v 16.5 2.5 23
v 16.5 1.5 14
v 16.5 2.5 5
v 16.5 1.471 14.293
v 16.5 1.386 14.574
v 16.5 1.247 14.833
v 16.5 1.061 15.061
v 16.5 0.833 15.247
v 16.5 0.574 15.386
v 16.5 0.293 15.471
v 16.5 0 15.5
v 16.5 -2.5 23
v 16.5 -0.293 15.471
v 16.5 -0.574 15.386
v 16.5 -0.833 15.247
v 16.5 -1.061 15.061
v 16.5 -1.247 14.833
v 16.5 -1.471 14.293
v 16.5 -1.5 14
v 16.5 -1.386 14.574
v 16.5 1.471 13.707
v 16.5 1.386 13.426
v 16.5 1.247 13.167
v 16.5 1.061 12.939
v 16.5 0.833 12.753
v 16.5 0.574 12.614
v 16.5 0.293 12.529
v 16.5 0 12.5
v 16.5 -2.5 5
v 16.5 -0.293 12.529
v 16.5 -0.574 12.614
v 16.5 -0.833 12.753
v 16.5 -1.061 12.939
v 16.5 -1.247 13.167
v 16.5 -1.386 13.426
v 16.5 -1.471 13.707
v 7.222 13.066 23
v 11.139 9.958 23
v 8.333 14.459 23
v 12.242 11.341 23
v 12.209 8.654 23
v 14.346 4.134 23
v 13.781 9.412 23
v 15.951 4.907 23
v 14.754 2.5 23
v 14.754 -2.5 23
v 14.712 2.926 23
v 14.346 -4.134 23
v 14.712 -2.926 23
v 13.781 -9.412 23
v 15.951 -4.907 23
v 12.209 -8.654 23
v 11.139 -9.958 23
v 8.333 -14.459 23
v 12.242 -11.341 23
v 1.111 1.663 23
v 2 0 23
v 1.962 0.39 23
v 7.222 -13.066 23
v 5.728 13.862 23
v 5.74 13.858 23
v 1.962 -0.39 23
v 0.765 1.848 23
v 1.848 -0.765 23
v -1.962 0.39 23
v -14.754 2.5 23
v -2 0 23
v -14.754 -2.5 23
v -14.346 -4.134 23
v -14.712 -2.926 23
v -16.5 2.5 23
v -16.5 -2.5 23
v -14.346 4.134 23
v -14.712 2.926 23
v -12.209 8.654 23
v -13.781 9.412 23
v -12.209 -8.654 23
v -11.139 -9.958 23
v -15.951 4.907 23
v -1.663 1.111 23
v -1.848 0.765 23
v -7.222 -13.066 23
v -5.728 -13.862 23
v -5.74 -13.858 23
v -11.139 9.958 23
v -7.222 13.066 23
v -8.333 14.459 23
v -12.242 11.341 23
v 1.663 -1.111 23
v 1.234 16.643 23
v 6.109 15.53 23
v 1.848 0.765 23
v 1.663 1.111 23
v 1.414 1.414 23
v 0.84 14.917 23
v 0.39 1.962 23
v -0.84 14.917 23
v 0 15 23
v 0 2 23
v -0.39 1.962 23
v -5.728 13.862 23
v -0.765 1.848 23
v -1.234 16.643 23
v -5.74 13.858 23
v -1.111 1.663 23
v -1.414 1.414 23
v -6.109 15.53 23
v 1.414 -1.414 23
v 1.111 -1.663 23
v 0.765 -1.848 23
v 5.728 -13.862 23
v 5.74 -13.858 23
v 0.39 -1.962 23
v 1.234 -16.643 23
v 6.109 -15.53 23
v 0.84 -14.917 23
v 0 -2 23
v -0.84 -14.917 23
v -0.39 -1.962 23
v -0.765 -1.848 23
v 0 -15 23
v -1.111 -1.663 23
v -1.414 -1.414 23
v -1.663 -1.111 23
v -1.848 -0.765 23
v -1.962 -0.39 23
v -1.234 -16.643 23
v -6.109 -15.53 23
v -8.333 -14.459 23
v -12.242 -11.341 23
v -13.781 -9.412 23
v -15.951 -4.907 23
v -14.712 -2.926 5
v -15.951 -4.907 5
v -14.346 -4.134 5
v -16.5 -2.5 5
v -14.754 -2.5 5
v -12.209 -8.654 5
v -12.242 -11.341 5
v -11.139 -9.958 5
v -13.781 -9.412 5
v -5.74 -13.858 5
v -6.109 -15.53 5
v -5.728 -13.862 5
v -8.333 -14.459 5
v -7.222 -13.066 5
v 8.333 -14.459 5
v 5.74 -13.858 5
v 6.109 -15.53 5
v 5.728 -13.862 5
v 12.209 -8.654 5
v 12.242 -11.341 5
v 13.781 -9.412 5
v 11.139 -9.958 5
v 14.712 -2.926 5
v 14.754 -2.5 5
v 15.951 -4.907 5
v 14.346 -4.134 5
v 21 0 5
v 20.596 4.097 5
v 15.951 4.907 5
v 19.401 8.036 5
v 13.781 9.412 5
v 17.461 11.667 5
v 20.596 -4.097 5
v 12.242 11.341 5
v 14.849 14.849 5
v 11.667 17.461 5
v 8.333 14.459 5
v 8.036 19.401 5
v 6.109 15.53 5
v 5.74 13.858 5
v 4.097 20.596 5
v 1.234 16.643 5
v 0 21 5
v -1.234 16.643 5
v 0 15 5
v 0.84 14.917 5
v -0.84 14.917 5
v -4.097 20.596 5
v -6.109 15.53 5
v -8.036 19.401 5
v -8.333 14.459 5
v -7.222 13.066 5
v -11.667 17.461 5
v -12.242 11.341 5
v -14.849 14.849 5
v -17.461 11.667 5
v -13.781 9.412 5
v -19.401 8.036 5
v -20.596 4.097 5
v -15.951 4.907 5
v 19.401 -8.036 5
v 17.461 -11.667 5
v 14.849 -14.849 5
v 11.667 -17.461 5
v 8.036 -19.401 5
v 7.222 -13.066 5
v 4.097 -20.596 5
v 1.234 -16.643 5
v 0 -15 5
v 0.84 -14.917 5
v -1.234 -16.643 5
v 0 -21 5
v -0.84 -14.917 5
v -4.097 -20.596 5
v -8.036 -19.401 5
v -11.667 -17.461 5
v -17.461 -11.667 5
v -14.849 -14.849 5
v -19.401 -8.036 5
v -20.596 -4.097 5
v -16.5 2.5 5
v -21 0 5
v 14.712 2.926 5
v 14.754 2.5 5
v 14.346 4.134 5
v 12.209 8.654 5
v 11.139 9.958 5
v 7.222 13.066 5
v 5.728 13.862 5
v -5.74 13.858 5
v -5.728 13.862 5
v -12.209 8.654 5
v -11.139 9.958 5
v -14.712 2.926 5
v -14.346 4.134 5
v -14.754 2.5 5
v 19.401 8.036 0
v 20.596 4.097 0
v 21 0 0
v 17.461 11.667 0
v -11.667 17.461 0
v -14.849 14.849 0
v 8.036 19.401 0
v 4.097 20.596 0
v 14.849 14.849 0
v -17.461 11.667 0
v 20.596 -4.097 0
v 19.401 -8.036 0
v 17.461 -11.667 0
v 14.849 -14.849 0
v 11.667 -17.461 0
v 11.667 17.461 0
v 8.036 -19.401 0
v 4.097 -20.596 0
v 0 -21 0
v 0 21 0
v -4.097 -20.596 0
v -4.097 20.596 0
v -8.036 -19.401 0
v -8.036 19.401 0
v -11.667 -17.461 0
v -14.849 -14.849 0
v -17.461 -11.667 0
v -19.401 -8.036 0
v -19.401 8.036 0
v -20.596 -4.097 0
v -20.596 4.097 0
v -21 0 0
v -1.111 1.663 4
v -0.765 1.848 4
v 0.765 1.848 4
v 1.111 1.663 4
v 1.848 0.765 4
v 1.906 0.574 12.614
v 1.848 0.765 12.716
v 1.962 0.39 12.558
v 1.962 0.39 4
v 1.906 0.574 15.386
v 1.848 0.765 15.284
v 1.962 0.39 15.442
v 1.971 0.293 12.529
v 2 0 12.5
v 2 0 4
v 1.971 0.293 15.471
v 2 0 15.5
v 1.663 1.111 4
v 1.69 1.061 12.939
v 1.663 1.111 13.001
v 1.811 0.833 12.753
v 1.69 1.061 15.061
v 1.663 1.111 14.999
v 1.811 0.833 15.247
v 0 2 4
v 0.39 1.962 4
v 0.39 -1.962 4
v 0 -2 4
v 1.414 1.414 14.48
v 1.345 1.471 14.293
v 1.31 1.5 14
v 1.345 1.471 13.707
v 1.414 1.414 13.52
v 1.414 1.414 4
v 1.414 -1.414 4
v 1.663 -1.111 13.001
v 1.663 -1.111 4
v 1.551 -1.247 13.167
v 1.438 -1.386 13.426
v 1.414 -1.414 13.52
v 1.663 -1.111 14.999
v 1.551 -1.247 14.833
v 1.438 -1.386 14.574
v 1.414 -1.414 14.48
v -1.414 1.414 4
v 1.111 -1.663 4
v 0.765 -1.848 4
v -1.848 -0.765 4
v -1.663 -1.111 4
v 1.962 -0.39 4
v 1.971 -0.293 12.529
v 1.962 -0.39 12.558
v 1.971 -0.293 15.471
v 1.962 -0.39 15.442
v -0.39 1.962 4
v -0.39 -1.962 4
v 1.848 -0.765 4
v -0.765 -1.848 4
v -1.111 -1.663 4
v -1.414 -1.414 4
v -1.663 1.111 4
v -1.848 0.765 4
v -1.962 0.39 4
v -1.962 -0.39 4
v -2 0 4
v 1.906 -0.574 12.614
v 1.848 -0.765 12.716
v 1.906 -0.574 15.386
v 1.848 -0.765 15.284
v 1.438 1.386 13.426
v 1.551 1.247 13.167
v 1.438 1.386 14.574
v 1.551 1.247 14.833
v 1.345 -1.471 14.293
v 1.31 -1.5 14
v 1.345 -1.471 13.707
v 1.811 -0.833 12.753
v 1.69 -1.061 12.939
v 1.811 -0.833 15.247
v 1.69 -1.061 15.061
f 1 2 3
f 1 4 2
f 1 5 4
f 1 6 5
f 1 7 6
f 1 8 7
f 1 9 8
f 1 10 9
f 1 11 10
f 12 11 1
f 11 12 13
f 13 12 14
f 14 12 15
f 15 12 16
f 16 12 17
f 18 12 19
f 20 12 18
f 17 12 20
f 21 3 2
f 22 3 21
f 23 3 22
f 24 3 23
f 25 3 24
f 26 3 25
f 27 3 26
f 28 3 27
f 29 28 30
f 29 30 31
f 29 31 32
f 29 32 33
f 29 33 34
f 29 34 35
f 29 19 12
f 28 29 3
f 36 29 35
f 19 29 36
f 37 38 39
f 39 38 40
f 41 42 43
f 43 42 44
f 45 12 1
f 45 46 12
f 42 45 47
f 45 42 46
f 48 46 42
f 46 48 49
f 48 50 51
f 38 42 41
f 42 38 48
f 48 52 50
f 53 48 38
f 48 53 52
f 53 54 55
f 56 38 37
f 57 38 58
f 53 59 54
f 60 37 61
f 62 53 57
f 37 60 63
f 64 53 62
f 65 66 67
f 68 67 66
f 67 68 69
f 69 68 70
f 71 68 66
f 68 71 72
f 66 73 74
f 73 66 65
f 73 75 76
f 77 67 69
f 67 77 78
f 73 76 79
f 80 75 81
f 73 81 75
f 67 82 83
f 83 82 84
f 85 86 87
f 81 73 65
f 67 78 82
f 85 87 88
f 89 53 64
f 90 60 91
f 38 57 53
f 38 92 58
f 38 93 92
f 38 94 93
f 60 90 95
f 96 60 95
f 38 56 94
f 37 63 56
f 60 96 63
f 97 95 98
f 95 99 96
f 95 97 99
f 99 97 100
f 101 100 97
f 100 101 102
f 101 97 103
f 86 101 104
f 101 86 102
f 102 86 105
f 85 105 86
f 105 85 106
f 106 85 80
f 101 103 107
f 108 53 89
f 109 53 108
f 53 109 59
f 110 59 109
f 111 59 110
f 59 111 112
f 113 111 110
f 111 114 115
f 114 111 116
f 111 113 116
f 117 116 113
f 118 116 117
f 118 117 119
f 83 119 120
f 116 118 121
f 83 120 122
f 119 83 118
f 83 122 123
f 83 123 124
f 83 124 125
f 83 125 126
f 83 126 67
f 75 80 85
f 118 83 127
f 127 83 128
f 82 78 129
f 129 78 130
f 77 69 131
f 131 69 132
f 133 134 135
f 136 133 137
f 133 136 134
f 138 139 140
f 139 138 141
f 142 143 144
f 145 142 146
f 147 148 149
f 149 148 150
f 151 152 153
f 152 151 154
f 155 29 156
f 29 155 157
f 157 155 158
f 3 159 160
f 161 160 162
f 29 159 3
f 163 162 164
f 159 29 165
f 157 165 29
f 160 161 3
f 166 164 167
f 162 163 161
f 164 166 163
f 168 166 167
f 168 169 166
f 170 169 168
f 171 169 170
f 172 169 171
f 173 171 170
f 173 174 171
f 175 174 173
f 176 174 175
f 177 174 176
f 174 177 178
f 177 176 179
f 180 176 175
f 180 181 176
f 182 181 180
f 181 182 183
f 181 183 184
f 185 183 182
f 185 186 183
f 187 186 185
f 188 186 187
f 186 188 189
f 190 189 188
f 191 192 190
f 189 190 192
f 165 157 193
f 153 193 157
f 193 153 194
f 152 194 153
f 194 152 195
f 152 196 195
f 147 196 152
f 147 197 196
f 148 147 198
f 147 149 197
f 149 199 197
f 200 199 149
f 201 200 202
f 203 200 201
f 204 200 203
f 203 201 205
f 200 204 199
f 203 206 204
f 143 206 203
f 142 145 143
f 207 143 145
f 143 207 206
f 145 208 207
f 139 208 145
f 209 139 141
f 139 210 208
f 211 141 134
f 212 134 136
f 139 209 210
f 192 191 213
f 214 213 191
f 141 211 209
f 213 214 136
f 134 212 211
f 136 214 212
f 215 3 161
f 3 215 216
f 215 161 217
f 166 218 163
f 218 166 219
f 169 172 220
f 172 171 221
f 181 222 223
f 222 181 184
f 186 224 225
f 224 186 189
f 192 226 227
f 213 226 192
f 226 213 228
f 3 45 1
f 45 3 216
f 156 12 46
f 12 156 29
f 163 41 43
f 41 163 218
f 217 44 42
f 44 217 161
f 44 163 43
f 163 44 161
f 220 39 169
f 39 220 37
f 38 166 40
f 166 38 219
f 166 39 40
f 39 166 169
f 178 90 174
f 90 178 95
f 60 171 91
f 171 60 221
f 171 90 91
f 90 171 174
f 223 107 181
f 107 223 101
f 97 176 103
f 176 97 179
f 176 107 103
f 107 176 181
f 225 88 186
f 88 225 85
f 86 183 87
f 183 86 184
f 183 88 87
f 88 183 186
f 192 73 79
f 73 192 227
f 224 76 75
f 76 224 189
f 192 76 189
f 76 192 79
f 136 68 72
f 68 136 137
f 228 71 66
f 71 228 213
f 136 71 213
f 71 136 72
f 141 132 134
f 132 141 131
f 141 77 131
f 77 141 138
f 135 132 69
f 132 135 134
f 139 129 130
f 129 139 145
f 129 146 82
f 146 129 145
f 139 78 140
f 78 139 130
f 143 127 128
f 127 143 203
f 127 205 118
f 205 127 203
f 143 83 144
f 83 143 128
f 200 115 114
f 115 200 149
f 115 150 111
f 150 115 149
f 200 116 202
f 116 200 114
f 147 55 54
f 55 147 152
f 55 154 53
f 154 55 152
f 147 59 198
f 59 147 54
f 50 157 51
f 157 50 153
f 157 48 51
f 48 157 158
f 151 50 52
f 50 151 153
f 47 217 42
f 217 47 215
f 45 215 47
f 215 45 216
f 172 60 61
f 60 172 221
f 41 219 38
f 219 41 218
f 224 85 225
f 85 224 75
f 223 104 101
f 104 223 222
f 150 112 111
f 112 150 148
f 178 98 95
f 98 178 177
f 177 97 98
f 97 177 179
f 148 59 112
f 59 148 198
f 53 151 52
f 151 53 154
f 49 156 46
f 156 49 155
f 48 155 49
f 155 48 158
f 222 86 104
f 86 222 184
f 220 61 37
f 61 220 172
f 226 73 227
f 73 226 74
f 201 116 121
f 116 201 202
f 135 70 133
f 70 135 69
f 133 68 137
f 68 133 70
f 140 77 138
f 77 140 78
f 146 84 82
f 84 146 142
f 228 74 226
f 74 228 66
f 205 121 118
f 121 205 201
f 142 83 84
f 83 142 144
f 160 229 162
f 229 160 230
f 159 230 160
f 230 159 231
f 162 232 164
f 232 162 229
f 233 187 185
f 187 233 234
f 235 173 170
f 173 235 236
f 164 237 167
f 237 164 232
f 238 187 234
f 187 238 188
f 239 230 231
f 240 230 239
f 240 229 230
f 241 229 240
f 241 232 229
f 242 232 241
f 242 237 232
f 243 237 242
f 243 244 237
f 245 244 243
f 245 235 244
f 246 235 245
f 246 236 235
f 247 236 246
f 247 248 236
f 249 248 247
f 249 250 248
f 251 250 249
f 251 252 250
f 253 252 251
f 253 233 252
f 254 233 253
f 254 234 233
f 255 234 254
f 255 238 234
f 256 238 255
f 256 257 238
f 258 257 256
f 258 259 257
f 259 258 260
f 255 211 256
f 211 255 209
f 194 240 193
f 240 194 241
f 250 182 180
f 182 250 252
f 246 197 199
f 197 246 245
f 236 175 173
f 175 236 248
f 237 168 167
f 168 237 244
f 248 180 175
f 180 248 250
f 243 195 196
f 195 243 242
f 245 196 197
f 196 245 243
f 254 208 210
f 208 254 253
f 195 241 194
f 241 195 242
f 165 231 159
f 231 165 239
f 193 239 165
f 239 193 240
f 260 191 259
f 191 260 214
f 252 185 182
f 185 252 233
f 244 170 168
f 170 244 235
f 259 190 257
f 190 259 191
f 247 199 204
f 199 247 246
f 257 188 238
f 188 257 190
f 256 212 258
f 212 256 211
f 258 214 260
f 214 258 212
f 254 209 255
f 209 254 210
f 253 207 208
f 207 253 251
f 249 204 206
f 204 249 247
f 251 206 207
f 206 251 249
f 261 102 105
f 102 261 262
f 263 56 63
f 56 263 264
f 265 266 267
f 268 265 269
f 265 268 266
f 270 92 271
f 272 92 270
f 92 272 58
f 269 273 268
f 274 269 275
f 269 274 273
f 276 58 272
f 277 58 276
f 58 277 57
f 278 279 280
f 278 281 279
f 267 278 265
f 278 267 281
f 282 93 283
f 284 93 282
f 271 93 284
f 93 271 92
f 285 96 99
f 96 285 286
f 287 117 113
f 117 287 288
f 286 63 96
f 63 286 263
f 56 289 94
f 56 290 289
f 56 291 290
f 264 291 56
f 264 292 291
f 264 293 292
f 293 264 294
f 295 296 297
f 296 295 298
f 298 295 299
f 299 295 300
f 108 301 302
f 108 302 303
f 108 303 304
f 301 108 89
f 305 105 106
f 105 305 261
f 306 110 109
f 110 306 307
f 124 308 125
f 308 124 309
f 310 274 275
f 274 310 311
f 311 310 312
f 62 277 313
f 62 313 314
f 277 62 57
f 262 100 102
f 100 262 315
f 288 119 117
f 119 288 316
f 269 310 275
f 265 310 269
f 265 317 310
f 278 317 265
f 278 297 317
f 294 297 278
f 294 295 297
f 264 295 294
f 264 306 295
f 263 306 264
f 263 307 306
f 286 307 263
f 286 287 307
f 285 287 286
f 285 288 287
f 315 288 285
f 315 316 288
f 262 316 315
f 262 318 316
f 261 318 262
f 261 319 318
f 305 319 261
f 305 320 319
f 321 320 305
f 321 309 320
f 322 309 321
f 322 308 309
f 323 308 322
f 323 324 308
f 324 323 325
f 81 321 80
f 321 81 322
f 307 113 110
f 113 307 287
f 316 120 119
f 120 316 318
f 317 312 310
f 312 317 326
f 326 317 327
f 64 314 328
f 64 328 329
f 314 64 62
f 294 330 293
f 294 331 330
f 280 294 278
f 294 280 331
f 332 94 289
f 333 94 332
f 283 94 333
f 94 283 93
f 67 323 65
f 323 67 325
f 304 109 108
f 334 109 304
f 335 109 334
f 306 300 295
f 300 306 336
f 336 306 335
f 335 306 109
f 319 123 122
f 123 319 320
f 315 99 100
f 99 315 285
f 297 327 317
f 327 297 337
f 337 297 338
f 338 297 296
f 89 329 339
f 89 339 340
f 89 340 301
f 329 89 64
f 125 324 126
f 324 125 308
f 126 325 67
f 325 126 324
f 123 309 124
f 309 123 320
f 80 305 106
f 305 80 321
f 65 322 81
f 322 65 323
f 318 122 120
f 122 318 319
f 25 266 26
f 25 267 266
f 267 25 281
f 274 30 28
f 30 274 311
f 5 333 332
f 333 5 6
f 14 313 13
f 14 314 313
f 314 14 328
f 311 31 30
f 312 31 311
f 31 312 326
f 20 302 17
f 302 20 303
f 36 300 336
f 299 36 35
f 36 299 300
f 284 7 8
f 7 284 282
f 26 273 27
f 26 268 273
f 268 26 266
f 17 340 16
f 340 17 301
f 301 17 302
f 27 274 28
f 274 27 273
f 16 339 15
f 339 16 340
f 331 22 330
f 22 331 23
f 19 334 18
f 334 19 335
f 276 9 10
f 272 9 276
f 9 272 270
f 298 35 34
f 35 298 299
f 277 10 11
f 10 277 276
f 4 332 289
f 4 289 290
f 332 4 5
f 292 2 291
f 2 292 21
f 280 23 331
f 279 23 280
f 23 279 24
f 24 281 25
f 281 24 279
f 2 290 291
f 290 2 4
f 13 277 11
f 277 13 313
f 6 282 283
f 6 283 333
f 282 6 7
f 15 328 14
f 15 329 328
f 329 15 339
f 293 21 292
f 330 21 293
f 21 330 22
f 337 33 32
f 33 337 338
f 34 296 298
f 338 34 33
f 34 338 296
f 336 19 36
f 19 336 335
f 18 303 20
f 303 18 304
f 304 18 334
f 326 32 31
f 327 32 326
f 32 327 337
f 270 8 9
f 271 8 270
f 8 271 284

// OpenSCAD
$fn = 32;

// ----------------------------------------------------------------------
// Control knob: skirt knob with grip ribs
// ----------------------------------------------------------------------

// --- parameters (mm) ---
skirt_d = 42;             // skirt diameter
skirt_t = 5;              // skirt thickness
rib_w = 5;                // grip rib width
rib_out = 2.5;            // grip rib radial protrusion
n_ribs = 14;              // number of grip ribs
knob_d = 30;              // knob body diameter
knob_h = 18;              // knob body height
bore_d = 4;               // shaft bore diameter
set_d = 3;                // set screw bore diameter

rib_step = 360 / n_ribs;  // rib angular step
total_h = skirt_t + knob_h;  // overall height

difference() {
  union() {
    translate([0, 0, skirt_t]) cylinder(h = knob_h, d = knob_d);
    cylinder(h = skirt_t, d = skirt_d);
    for (i = [0 : n_ribs - 1])
      rotate([0, 0, i * rib_step])
        translate([knob_d / 2 - 1, -rib_w / 2, skirt_t])
          cube([rib_out, rib_w, knob_h]);
  }
  translate([0, 0, skirt_t - 1]) cylinder(h = knob_h + 2, d = bore_d);
  translate([-1, 0, skirt_t + knob_h / 2]) rotate([0, 90, 0])
    cylinder(h = knob_d / 2 + bore_d / 2 + 2, d = set_d);
}
